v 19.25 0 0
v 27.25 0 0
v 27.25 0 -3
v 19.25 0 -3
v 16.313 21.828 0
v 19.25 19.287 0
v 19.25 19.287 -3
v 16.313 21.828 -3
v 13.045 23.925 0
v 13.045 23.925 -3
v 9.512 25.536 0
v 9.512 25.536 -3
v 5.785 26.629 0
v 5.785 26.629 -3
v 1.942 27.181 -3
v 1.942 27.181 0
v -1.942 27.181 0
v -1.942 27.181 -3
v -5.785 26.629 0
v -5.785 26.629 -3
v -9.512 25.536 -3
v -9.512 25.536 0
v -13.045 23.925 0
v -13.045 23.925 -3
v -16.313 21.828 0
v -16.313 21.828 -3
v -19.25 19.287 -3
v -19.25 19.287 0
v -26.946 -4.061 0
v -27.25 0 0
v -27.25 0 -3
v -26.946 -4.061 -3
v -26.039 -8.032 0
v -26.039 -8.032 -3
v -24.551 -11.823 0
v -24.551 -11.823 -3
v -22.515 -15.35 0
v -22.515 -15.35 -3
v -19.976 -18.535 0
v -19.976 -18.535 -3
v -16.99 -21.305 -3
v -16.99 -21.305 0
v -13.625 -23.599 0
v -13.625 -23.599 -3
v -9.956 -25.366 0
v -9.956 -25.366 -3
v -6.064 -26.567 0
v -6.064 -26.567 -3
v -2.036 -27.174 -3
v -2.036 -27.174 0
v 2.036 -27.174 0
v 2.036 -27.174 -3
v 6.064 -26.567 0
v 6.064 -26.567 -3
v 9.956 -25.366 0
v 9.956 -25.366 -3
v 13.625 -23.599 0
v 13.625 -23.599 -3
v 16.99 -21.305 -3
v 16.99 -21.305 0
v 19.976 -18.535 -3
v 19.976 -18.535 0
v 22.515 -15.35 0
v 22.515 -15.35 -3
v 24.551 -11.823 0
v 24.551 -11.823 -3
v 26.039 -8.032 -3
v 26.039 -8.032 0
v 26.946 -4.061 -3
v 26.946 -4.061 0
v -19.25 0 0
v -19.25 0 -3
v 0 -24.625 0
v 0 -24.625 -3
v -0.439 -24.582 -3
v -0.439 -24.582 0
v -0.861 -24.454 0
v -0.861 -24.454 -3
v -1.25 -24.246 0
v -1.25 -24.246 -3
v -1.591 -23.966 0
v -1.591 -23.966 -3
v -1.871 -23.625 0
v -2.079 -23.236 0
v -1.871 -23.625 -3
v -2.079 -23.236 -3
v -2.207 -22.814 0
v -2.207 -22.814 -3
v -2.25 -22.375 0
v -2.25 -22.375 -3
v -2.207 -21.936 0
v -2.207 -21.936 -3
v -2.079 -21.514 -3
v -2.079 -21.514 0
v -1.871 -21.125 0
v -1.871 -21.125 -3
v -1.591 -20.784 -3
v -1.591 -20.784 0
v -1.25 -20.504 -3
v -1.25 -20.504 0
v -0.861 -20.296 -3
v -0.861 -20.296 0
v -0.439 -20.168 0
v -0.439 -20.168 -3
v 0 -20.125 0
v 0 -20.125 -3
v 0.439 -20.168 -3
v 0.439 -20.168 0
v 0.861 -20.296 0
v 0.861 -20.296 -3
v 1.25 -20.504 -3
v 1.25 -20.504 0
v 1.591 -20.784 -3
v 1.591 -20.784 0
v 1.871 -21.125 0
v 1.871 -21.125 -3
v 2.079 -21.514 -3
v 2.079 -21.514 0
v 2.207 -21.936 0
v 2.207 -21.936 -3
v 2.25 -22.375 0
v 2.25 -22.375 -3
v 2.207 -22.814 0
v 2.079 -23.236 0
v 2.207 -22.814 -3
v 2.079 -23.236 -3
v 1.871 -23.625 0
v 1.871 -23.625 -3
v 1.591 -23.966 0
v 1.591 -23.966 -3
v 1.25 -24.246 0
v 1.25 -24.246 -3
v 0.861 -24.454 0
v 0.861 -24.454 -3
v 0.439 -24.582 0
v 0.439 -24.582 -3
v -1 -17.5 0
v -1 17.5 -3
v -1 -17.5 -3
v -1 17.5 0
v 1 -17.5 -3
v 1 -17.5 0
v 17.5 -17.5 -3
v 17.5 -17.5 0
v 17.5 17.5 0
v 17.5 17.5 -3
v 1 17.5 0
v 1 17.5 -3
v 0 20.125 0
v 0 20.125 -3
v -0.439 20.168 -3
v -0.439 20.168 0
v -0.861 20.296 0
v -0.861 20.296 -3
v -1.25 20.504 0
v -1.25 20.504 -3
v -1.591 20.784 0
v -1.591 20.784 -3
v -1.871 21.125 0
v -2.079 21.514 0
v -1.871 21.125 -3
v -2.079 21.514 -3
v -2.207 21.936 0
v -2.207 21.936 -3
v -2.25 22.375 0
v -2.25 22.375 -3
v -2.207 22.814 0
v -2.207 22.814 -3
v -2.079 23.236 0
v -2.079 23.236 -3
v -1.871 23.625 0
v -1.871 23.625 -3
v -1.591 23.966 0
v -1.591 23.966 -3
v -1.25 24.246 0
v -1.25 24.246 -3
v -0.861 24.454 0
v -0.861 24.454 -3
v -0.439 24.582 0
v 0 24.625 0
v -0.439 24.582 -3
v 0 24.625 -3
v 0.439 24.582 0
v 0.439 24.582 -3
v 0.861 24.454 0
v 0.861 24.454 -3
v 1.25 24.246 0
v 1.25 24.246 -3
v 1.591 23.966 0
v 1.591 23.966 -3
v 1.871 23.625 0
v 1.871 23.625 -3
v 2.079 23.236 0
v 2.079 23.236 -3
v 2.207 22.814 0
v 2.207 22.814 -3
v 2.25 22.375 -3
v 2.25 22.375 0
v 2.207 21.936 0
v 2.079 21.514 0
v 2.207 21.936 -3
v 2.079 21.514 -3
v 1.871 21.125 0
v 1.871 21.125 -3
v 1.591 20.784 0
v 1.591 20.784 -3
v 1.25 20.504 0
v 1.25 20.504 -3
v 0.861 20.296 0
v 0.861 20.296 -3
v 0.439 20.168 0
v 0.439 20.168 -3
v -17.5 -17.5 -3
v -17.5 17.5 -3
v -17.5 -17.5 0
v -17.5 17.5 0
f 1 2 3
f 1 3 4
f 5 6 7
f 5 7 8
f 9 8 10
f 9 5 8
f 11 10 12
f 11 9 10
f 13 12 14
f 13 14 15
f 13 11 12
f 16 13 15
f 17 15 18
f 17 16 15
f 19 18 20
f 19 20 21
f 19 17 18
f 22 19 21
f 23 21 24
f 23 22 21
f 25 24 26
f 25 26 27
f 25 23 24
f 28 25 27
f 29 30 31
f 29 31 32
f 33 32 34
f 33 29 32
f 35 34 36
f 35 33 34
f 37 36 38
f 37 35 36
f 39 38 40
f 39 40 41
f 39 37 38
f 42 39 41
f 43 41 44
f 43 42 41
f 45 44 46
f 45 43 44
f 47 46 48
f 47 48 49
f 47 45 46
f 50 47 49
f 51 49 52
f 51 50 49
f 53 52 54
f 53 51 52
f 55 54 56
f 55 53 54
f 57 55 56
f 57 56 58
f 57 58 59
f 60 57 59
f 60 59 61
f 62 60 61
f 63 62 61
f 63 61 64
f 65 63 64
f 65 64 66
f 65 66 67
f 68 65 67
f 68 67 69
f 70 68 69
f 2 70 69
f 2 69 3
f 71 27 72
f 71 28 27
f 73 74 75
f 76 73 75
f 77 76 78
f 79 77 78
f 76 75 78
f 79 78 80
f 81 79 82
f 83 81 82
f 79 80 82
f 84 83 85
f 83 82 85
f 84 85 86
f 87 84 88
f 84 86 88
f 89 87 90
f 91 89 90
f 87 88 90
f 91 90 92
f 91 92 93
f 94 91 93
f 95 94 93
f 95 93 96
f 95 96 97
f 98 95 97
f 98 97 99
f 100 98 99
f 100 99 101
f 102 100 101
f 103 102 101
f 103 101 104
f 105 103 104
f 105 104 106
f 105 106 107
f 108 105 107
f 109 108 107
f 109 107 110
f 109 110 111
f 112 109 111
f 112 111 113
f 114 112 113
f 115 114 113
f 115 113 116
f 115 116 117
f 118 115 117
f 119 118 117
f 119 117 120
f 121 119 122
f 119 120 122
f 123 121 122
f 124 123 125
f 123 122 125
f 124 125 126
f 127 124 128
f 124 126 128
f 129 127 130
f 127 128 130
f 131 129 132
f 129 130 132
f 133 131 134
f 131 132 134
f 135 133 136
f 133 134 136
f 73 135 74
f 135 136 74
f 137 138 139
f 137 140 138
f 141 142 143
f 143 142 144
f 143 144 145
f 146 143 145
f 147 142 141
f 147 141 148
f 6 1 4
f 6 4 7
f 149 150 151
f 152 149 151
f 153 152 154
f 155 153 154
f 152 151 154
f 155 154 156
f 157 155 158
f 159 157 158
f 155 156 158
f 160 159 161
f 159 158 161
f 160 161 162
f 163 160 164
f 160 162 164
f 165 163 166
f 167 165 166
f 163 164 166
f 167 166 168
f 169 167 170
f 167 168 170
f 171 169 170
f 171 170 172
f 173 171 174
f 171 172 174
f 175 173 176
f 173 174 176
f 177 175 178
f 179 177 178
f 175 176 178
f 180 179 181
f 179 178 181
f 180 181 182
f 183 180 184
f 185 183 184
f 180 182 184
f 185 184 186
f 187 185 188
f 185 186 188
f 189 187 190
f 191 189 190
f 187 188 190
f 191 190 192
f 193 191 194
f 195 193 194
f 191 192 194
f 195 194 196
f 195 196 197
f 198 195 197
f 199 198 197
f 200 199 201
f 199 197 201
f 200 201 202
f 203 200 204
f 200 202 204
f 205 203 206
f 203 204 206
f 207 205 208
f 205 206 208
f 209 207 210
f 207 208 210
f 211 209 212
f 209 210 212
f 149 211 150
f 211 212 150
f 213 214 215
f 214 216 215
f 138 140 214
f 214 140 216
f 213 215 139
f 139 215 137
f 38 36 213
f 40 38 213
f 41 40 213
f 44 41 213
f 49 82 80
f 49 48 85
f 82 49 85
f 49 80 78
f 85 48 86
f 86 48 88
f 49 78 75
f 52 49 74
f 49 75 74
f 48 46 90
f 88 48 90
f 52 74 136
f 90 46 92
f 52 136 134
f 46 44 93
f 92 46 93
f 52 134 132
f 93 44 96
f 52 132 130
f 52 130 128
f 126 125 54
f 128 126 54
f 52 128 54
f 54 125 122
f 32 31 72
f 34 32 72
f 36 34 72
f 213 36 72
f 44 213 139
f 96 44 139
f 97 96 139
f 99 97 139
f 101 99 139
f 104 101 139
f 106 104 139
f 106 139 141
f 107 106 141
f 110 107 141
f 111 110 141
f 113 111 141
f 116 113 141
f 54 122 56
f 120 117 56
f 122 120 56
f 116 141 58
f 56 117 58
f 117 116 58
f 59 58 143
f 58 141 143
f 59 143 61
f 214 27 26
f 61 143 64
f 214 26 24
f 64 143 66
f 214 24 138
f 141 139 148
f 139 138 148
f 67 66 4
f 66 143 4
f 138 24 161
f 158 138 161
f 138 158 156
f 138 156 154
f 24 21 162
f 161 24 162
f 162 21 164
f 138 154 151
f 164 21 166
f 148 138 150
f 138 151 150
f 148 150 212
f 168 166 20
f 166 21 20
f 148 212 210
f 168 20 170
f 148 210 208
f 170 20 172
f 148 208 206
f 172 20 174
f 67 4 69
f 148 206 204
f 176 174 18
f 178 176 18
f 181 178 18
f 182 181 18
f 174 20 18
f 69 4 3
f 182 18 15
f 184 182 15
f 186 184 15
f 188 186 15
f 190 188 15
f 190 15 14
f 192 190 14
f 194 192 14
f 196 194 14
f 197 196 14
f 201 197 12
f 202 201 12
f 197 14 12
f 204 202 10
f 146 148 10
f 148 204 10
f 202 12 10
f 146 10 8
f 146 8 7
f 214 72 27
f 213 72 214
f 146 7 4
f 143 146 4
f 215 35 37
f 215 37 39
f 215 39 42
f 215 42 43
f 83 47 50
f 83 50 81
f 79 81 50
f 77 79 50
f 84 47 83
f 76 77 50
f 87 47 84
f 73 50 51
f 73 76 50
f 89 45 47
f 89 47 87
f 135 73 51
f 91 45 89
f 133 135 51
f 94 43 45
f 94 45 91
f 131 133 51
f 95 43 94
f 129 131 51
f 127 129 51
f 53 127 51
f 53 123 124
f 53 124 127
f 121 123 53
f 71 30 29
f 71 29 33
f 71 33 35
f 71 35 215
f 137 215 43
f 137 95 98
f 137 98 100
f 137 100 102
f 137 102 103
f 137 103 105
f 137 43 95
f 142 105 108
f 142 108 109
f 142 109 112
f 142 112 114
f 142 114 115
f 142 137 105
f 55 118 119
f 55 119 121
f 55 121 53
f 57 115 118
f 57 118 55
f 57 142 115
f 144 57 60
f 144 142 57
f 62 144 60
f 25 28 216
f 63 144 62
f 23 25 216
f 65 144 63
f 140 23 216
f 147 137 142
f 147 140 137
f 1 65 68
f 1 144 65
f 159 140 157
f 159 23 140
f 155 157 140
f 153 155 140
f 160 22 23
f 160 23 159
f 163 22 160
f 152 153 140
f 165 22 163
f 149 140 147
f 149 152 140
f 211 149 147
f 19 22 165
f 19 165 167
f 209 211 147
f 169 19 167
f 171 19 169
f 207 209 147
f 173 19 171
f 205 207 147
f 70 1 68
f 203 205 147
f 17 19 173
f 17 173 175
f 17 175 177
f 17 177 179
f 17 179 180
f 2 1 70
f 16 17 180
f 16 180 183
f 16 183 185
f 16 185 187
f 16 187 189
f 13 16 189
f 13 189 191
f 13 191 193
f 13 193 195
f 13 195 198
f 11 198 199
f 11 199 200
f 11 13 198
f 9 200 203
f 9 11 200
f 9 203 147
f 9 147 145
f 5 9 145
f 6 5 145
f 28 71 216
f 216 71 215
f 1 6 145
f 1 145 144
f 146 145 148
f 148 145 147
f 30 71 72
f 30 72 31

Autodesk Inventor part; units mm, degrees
ref_plane "YZ Plane" through (0, 0, 0) normal (1, 0, 0) x (0, 1, 0)
ref_plane "XZ Plane" through (0, 0, 0) normal (0, 1, 0) x (-1, 0, 0)
ref_plane "XY Plane" through (0, 0, 0) normal (0, 0, 1) x (1, 0, 0)
sketch "スケッチ1" plane through (0, 0, 0) normal (0, 0, 1) x (1, 0, 0)
  circle A0 centre (0, 0) radius 27.25
  line L0 (17.5, 17.5) -> (-17.5, 17.5)
  line L1 (-17.5, 17.5) -> (-17.5, -17.5)
  line L2 (-17.5, -17.5) -> (17.5, -17.5)
  line L3 (17.5, -17.5) -> (17.5, 17.5)
  line L4 (17.5, 17.5) -> (-17.5, -17.5) construction
  line L5 (-17.5, 17.5) -> (17.5, -17.5) construction
  line L6 (1, 17.5) -> (-1, 17.5)
  line L7 (-1, 17.5) -> (-1, -17.5)
  line L8 (-1, -17.5) -> (1, -17.5)
  line L9 (1, -17.5) -> (1, 17.5)
  line L10 (1, 17.5) -> (-1, -17.5) construction
  line L11 (-1, 17.5) -> (1, -17.5) construction
  point P0 (1, -17.5)
  point P1 (1, 17.5)
  point P2 (-1, 17.5)
  point P3 (-1, -17.5)
  dimension "d0" = 54.5
  dimension "d6" = 35
  dimension "d107" = 2
  dimension "d108" = 35
extrude "押し出し1" add sketch "スケッチ1" against normal blind 3 contours A0 | L9 L2 L7 L0
sketch "スケッチ2" plane through (0, 0, 0) normal (0, 0, 1) x (1, 0, 0)
  line L0 (0, 42.4511) -> (0, -37.5489)
  line L1 (38.0038, 0) -> (-41.9962, 0)
  line L2 (27.25, 42.0143) -> (27.25, -37.9857)
  circle A0 centre (0, 0) radius 27.25 projected
  line L3 (17.5, 17.5) -> (17.5, -17.5) projected
  line L4 (19.25, 25) -> (27.25, 25)
  line L5 (27.25, 25) -> (27.25, -25)
  line L6 (27.25, -25) -> (19.25, -25)
  line L7 (19.25, -25) -> (19.25, 25)
  line L8 (19.25, 25) -> (27.25, -25) construction
  line L9 (27.25, 25) -> (19.25, -25) construction
  point P0 (17.5, 0)
  point P1 (23.25, 0)
  point P2 (19.25, 0)
  point P3 (27.25, 0)
  dimension "d13" = 9.75
  dimension "d14" = 8
  dimension "d15" = 50
  dimension "d19" = 54.5
  dimension "d110" = 1.75
extrude "押し出し2" cut sketch "スケッチ2" against normal blind 10 contours L7 L4 L2 A0 | A0 L1 L7 picked at (20.3822, 11.481)
mirror "ミラー1" about plane through (0, 0, 0) normal (1, 0, 0) of "押し出し2"
sketch "スケッチ8" plane through (0, 0, 0) normal (0, 0, 1) x (1, 0, 0)
  circle A0 centre (0, 0) radius 22.375
  circle A1 centre (0, 0) radius 27.25
  line L0 (0, 31.1603) -> (0, -30.8706)
  point P0 (0, 0)
  point P1 (0, 22.375)
  point P2 (0, -22.375)
  dimension "d112" = 44.75
  dimension "d113" = 54.5
hole "穴5" at (0, 22.375, 0) at (0, -22.375, 0) direction (0, 0, -1) diameter 4.5 end through all clearance for "Countersunk Flat Head Screw ISO 2009/7046" size "M4" standard "ISO"
properties part number "Part3_A_Y" material "鋼、軟鋼"
